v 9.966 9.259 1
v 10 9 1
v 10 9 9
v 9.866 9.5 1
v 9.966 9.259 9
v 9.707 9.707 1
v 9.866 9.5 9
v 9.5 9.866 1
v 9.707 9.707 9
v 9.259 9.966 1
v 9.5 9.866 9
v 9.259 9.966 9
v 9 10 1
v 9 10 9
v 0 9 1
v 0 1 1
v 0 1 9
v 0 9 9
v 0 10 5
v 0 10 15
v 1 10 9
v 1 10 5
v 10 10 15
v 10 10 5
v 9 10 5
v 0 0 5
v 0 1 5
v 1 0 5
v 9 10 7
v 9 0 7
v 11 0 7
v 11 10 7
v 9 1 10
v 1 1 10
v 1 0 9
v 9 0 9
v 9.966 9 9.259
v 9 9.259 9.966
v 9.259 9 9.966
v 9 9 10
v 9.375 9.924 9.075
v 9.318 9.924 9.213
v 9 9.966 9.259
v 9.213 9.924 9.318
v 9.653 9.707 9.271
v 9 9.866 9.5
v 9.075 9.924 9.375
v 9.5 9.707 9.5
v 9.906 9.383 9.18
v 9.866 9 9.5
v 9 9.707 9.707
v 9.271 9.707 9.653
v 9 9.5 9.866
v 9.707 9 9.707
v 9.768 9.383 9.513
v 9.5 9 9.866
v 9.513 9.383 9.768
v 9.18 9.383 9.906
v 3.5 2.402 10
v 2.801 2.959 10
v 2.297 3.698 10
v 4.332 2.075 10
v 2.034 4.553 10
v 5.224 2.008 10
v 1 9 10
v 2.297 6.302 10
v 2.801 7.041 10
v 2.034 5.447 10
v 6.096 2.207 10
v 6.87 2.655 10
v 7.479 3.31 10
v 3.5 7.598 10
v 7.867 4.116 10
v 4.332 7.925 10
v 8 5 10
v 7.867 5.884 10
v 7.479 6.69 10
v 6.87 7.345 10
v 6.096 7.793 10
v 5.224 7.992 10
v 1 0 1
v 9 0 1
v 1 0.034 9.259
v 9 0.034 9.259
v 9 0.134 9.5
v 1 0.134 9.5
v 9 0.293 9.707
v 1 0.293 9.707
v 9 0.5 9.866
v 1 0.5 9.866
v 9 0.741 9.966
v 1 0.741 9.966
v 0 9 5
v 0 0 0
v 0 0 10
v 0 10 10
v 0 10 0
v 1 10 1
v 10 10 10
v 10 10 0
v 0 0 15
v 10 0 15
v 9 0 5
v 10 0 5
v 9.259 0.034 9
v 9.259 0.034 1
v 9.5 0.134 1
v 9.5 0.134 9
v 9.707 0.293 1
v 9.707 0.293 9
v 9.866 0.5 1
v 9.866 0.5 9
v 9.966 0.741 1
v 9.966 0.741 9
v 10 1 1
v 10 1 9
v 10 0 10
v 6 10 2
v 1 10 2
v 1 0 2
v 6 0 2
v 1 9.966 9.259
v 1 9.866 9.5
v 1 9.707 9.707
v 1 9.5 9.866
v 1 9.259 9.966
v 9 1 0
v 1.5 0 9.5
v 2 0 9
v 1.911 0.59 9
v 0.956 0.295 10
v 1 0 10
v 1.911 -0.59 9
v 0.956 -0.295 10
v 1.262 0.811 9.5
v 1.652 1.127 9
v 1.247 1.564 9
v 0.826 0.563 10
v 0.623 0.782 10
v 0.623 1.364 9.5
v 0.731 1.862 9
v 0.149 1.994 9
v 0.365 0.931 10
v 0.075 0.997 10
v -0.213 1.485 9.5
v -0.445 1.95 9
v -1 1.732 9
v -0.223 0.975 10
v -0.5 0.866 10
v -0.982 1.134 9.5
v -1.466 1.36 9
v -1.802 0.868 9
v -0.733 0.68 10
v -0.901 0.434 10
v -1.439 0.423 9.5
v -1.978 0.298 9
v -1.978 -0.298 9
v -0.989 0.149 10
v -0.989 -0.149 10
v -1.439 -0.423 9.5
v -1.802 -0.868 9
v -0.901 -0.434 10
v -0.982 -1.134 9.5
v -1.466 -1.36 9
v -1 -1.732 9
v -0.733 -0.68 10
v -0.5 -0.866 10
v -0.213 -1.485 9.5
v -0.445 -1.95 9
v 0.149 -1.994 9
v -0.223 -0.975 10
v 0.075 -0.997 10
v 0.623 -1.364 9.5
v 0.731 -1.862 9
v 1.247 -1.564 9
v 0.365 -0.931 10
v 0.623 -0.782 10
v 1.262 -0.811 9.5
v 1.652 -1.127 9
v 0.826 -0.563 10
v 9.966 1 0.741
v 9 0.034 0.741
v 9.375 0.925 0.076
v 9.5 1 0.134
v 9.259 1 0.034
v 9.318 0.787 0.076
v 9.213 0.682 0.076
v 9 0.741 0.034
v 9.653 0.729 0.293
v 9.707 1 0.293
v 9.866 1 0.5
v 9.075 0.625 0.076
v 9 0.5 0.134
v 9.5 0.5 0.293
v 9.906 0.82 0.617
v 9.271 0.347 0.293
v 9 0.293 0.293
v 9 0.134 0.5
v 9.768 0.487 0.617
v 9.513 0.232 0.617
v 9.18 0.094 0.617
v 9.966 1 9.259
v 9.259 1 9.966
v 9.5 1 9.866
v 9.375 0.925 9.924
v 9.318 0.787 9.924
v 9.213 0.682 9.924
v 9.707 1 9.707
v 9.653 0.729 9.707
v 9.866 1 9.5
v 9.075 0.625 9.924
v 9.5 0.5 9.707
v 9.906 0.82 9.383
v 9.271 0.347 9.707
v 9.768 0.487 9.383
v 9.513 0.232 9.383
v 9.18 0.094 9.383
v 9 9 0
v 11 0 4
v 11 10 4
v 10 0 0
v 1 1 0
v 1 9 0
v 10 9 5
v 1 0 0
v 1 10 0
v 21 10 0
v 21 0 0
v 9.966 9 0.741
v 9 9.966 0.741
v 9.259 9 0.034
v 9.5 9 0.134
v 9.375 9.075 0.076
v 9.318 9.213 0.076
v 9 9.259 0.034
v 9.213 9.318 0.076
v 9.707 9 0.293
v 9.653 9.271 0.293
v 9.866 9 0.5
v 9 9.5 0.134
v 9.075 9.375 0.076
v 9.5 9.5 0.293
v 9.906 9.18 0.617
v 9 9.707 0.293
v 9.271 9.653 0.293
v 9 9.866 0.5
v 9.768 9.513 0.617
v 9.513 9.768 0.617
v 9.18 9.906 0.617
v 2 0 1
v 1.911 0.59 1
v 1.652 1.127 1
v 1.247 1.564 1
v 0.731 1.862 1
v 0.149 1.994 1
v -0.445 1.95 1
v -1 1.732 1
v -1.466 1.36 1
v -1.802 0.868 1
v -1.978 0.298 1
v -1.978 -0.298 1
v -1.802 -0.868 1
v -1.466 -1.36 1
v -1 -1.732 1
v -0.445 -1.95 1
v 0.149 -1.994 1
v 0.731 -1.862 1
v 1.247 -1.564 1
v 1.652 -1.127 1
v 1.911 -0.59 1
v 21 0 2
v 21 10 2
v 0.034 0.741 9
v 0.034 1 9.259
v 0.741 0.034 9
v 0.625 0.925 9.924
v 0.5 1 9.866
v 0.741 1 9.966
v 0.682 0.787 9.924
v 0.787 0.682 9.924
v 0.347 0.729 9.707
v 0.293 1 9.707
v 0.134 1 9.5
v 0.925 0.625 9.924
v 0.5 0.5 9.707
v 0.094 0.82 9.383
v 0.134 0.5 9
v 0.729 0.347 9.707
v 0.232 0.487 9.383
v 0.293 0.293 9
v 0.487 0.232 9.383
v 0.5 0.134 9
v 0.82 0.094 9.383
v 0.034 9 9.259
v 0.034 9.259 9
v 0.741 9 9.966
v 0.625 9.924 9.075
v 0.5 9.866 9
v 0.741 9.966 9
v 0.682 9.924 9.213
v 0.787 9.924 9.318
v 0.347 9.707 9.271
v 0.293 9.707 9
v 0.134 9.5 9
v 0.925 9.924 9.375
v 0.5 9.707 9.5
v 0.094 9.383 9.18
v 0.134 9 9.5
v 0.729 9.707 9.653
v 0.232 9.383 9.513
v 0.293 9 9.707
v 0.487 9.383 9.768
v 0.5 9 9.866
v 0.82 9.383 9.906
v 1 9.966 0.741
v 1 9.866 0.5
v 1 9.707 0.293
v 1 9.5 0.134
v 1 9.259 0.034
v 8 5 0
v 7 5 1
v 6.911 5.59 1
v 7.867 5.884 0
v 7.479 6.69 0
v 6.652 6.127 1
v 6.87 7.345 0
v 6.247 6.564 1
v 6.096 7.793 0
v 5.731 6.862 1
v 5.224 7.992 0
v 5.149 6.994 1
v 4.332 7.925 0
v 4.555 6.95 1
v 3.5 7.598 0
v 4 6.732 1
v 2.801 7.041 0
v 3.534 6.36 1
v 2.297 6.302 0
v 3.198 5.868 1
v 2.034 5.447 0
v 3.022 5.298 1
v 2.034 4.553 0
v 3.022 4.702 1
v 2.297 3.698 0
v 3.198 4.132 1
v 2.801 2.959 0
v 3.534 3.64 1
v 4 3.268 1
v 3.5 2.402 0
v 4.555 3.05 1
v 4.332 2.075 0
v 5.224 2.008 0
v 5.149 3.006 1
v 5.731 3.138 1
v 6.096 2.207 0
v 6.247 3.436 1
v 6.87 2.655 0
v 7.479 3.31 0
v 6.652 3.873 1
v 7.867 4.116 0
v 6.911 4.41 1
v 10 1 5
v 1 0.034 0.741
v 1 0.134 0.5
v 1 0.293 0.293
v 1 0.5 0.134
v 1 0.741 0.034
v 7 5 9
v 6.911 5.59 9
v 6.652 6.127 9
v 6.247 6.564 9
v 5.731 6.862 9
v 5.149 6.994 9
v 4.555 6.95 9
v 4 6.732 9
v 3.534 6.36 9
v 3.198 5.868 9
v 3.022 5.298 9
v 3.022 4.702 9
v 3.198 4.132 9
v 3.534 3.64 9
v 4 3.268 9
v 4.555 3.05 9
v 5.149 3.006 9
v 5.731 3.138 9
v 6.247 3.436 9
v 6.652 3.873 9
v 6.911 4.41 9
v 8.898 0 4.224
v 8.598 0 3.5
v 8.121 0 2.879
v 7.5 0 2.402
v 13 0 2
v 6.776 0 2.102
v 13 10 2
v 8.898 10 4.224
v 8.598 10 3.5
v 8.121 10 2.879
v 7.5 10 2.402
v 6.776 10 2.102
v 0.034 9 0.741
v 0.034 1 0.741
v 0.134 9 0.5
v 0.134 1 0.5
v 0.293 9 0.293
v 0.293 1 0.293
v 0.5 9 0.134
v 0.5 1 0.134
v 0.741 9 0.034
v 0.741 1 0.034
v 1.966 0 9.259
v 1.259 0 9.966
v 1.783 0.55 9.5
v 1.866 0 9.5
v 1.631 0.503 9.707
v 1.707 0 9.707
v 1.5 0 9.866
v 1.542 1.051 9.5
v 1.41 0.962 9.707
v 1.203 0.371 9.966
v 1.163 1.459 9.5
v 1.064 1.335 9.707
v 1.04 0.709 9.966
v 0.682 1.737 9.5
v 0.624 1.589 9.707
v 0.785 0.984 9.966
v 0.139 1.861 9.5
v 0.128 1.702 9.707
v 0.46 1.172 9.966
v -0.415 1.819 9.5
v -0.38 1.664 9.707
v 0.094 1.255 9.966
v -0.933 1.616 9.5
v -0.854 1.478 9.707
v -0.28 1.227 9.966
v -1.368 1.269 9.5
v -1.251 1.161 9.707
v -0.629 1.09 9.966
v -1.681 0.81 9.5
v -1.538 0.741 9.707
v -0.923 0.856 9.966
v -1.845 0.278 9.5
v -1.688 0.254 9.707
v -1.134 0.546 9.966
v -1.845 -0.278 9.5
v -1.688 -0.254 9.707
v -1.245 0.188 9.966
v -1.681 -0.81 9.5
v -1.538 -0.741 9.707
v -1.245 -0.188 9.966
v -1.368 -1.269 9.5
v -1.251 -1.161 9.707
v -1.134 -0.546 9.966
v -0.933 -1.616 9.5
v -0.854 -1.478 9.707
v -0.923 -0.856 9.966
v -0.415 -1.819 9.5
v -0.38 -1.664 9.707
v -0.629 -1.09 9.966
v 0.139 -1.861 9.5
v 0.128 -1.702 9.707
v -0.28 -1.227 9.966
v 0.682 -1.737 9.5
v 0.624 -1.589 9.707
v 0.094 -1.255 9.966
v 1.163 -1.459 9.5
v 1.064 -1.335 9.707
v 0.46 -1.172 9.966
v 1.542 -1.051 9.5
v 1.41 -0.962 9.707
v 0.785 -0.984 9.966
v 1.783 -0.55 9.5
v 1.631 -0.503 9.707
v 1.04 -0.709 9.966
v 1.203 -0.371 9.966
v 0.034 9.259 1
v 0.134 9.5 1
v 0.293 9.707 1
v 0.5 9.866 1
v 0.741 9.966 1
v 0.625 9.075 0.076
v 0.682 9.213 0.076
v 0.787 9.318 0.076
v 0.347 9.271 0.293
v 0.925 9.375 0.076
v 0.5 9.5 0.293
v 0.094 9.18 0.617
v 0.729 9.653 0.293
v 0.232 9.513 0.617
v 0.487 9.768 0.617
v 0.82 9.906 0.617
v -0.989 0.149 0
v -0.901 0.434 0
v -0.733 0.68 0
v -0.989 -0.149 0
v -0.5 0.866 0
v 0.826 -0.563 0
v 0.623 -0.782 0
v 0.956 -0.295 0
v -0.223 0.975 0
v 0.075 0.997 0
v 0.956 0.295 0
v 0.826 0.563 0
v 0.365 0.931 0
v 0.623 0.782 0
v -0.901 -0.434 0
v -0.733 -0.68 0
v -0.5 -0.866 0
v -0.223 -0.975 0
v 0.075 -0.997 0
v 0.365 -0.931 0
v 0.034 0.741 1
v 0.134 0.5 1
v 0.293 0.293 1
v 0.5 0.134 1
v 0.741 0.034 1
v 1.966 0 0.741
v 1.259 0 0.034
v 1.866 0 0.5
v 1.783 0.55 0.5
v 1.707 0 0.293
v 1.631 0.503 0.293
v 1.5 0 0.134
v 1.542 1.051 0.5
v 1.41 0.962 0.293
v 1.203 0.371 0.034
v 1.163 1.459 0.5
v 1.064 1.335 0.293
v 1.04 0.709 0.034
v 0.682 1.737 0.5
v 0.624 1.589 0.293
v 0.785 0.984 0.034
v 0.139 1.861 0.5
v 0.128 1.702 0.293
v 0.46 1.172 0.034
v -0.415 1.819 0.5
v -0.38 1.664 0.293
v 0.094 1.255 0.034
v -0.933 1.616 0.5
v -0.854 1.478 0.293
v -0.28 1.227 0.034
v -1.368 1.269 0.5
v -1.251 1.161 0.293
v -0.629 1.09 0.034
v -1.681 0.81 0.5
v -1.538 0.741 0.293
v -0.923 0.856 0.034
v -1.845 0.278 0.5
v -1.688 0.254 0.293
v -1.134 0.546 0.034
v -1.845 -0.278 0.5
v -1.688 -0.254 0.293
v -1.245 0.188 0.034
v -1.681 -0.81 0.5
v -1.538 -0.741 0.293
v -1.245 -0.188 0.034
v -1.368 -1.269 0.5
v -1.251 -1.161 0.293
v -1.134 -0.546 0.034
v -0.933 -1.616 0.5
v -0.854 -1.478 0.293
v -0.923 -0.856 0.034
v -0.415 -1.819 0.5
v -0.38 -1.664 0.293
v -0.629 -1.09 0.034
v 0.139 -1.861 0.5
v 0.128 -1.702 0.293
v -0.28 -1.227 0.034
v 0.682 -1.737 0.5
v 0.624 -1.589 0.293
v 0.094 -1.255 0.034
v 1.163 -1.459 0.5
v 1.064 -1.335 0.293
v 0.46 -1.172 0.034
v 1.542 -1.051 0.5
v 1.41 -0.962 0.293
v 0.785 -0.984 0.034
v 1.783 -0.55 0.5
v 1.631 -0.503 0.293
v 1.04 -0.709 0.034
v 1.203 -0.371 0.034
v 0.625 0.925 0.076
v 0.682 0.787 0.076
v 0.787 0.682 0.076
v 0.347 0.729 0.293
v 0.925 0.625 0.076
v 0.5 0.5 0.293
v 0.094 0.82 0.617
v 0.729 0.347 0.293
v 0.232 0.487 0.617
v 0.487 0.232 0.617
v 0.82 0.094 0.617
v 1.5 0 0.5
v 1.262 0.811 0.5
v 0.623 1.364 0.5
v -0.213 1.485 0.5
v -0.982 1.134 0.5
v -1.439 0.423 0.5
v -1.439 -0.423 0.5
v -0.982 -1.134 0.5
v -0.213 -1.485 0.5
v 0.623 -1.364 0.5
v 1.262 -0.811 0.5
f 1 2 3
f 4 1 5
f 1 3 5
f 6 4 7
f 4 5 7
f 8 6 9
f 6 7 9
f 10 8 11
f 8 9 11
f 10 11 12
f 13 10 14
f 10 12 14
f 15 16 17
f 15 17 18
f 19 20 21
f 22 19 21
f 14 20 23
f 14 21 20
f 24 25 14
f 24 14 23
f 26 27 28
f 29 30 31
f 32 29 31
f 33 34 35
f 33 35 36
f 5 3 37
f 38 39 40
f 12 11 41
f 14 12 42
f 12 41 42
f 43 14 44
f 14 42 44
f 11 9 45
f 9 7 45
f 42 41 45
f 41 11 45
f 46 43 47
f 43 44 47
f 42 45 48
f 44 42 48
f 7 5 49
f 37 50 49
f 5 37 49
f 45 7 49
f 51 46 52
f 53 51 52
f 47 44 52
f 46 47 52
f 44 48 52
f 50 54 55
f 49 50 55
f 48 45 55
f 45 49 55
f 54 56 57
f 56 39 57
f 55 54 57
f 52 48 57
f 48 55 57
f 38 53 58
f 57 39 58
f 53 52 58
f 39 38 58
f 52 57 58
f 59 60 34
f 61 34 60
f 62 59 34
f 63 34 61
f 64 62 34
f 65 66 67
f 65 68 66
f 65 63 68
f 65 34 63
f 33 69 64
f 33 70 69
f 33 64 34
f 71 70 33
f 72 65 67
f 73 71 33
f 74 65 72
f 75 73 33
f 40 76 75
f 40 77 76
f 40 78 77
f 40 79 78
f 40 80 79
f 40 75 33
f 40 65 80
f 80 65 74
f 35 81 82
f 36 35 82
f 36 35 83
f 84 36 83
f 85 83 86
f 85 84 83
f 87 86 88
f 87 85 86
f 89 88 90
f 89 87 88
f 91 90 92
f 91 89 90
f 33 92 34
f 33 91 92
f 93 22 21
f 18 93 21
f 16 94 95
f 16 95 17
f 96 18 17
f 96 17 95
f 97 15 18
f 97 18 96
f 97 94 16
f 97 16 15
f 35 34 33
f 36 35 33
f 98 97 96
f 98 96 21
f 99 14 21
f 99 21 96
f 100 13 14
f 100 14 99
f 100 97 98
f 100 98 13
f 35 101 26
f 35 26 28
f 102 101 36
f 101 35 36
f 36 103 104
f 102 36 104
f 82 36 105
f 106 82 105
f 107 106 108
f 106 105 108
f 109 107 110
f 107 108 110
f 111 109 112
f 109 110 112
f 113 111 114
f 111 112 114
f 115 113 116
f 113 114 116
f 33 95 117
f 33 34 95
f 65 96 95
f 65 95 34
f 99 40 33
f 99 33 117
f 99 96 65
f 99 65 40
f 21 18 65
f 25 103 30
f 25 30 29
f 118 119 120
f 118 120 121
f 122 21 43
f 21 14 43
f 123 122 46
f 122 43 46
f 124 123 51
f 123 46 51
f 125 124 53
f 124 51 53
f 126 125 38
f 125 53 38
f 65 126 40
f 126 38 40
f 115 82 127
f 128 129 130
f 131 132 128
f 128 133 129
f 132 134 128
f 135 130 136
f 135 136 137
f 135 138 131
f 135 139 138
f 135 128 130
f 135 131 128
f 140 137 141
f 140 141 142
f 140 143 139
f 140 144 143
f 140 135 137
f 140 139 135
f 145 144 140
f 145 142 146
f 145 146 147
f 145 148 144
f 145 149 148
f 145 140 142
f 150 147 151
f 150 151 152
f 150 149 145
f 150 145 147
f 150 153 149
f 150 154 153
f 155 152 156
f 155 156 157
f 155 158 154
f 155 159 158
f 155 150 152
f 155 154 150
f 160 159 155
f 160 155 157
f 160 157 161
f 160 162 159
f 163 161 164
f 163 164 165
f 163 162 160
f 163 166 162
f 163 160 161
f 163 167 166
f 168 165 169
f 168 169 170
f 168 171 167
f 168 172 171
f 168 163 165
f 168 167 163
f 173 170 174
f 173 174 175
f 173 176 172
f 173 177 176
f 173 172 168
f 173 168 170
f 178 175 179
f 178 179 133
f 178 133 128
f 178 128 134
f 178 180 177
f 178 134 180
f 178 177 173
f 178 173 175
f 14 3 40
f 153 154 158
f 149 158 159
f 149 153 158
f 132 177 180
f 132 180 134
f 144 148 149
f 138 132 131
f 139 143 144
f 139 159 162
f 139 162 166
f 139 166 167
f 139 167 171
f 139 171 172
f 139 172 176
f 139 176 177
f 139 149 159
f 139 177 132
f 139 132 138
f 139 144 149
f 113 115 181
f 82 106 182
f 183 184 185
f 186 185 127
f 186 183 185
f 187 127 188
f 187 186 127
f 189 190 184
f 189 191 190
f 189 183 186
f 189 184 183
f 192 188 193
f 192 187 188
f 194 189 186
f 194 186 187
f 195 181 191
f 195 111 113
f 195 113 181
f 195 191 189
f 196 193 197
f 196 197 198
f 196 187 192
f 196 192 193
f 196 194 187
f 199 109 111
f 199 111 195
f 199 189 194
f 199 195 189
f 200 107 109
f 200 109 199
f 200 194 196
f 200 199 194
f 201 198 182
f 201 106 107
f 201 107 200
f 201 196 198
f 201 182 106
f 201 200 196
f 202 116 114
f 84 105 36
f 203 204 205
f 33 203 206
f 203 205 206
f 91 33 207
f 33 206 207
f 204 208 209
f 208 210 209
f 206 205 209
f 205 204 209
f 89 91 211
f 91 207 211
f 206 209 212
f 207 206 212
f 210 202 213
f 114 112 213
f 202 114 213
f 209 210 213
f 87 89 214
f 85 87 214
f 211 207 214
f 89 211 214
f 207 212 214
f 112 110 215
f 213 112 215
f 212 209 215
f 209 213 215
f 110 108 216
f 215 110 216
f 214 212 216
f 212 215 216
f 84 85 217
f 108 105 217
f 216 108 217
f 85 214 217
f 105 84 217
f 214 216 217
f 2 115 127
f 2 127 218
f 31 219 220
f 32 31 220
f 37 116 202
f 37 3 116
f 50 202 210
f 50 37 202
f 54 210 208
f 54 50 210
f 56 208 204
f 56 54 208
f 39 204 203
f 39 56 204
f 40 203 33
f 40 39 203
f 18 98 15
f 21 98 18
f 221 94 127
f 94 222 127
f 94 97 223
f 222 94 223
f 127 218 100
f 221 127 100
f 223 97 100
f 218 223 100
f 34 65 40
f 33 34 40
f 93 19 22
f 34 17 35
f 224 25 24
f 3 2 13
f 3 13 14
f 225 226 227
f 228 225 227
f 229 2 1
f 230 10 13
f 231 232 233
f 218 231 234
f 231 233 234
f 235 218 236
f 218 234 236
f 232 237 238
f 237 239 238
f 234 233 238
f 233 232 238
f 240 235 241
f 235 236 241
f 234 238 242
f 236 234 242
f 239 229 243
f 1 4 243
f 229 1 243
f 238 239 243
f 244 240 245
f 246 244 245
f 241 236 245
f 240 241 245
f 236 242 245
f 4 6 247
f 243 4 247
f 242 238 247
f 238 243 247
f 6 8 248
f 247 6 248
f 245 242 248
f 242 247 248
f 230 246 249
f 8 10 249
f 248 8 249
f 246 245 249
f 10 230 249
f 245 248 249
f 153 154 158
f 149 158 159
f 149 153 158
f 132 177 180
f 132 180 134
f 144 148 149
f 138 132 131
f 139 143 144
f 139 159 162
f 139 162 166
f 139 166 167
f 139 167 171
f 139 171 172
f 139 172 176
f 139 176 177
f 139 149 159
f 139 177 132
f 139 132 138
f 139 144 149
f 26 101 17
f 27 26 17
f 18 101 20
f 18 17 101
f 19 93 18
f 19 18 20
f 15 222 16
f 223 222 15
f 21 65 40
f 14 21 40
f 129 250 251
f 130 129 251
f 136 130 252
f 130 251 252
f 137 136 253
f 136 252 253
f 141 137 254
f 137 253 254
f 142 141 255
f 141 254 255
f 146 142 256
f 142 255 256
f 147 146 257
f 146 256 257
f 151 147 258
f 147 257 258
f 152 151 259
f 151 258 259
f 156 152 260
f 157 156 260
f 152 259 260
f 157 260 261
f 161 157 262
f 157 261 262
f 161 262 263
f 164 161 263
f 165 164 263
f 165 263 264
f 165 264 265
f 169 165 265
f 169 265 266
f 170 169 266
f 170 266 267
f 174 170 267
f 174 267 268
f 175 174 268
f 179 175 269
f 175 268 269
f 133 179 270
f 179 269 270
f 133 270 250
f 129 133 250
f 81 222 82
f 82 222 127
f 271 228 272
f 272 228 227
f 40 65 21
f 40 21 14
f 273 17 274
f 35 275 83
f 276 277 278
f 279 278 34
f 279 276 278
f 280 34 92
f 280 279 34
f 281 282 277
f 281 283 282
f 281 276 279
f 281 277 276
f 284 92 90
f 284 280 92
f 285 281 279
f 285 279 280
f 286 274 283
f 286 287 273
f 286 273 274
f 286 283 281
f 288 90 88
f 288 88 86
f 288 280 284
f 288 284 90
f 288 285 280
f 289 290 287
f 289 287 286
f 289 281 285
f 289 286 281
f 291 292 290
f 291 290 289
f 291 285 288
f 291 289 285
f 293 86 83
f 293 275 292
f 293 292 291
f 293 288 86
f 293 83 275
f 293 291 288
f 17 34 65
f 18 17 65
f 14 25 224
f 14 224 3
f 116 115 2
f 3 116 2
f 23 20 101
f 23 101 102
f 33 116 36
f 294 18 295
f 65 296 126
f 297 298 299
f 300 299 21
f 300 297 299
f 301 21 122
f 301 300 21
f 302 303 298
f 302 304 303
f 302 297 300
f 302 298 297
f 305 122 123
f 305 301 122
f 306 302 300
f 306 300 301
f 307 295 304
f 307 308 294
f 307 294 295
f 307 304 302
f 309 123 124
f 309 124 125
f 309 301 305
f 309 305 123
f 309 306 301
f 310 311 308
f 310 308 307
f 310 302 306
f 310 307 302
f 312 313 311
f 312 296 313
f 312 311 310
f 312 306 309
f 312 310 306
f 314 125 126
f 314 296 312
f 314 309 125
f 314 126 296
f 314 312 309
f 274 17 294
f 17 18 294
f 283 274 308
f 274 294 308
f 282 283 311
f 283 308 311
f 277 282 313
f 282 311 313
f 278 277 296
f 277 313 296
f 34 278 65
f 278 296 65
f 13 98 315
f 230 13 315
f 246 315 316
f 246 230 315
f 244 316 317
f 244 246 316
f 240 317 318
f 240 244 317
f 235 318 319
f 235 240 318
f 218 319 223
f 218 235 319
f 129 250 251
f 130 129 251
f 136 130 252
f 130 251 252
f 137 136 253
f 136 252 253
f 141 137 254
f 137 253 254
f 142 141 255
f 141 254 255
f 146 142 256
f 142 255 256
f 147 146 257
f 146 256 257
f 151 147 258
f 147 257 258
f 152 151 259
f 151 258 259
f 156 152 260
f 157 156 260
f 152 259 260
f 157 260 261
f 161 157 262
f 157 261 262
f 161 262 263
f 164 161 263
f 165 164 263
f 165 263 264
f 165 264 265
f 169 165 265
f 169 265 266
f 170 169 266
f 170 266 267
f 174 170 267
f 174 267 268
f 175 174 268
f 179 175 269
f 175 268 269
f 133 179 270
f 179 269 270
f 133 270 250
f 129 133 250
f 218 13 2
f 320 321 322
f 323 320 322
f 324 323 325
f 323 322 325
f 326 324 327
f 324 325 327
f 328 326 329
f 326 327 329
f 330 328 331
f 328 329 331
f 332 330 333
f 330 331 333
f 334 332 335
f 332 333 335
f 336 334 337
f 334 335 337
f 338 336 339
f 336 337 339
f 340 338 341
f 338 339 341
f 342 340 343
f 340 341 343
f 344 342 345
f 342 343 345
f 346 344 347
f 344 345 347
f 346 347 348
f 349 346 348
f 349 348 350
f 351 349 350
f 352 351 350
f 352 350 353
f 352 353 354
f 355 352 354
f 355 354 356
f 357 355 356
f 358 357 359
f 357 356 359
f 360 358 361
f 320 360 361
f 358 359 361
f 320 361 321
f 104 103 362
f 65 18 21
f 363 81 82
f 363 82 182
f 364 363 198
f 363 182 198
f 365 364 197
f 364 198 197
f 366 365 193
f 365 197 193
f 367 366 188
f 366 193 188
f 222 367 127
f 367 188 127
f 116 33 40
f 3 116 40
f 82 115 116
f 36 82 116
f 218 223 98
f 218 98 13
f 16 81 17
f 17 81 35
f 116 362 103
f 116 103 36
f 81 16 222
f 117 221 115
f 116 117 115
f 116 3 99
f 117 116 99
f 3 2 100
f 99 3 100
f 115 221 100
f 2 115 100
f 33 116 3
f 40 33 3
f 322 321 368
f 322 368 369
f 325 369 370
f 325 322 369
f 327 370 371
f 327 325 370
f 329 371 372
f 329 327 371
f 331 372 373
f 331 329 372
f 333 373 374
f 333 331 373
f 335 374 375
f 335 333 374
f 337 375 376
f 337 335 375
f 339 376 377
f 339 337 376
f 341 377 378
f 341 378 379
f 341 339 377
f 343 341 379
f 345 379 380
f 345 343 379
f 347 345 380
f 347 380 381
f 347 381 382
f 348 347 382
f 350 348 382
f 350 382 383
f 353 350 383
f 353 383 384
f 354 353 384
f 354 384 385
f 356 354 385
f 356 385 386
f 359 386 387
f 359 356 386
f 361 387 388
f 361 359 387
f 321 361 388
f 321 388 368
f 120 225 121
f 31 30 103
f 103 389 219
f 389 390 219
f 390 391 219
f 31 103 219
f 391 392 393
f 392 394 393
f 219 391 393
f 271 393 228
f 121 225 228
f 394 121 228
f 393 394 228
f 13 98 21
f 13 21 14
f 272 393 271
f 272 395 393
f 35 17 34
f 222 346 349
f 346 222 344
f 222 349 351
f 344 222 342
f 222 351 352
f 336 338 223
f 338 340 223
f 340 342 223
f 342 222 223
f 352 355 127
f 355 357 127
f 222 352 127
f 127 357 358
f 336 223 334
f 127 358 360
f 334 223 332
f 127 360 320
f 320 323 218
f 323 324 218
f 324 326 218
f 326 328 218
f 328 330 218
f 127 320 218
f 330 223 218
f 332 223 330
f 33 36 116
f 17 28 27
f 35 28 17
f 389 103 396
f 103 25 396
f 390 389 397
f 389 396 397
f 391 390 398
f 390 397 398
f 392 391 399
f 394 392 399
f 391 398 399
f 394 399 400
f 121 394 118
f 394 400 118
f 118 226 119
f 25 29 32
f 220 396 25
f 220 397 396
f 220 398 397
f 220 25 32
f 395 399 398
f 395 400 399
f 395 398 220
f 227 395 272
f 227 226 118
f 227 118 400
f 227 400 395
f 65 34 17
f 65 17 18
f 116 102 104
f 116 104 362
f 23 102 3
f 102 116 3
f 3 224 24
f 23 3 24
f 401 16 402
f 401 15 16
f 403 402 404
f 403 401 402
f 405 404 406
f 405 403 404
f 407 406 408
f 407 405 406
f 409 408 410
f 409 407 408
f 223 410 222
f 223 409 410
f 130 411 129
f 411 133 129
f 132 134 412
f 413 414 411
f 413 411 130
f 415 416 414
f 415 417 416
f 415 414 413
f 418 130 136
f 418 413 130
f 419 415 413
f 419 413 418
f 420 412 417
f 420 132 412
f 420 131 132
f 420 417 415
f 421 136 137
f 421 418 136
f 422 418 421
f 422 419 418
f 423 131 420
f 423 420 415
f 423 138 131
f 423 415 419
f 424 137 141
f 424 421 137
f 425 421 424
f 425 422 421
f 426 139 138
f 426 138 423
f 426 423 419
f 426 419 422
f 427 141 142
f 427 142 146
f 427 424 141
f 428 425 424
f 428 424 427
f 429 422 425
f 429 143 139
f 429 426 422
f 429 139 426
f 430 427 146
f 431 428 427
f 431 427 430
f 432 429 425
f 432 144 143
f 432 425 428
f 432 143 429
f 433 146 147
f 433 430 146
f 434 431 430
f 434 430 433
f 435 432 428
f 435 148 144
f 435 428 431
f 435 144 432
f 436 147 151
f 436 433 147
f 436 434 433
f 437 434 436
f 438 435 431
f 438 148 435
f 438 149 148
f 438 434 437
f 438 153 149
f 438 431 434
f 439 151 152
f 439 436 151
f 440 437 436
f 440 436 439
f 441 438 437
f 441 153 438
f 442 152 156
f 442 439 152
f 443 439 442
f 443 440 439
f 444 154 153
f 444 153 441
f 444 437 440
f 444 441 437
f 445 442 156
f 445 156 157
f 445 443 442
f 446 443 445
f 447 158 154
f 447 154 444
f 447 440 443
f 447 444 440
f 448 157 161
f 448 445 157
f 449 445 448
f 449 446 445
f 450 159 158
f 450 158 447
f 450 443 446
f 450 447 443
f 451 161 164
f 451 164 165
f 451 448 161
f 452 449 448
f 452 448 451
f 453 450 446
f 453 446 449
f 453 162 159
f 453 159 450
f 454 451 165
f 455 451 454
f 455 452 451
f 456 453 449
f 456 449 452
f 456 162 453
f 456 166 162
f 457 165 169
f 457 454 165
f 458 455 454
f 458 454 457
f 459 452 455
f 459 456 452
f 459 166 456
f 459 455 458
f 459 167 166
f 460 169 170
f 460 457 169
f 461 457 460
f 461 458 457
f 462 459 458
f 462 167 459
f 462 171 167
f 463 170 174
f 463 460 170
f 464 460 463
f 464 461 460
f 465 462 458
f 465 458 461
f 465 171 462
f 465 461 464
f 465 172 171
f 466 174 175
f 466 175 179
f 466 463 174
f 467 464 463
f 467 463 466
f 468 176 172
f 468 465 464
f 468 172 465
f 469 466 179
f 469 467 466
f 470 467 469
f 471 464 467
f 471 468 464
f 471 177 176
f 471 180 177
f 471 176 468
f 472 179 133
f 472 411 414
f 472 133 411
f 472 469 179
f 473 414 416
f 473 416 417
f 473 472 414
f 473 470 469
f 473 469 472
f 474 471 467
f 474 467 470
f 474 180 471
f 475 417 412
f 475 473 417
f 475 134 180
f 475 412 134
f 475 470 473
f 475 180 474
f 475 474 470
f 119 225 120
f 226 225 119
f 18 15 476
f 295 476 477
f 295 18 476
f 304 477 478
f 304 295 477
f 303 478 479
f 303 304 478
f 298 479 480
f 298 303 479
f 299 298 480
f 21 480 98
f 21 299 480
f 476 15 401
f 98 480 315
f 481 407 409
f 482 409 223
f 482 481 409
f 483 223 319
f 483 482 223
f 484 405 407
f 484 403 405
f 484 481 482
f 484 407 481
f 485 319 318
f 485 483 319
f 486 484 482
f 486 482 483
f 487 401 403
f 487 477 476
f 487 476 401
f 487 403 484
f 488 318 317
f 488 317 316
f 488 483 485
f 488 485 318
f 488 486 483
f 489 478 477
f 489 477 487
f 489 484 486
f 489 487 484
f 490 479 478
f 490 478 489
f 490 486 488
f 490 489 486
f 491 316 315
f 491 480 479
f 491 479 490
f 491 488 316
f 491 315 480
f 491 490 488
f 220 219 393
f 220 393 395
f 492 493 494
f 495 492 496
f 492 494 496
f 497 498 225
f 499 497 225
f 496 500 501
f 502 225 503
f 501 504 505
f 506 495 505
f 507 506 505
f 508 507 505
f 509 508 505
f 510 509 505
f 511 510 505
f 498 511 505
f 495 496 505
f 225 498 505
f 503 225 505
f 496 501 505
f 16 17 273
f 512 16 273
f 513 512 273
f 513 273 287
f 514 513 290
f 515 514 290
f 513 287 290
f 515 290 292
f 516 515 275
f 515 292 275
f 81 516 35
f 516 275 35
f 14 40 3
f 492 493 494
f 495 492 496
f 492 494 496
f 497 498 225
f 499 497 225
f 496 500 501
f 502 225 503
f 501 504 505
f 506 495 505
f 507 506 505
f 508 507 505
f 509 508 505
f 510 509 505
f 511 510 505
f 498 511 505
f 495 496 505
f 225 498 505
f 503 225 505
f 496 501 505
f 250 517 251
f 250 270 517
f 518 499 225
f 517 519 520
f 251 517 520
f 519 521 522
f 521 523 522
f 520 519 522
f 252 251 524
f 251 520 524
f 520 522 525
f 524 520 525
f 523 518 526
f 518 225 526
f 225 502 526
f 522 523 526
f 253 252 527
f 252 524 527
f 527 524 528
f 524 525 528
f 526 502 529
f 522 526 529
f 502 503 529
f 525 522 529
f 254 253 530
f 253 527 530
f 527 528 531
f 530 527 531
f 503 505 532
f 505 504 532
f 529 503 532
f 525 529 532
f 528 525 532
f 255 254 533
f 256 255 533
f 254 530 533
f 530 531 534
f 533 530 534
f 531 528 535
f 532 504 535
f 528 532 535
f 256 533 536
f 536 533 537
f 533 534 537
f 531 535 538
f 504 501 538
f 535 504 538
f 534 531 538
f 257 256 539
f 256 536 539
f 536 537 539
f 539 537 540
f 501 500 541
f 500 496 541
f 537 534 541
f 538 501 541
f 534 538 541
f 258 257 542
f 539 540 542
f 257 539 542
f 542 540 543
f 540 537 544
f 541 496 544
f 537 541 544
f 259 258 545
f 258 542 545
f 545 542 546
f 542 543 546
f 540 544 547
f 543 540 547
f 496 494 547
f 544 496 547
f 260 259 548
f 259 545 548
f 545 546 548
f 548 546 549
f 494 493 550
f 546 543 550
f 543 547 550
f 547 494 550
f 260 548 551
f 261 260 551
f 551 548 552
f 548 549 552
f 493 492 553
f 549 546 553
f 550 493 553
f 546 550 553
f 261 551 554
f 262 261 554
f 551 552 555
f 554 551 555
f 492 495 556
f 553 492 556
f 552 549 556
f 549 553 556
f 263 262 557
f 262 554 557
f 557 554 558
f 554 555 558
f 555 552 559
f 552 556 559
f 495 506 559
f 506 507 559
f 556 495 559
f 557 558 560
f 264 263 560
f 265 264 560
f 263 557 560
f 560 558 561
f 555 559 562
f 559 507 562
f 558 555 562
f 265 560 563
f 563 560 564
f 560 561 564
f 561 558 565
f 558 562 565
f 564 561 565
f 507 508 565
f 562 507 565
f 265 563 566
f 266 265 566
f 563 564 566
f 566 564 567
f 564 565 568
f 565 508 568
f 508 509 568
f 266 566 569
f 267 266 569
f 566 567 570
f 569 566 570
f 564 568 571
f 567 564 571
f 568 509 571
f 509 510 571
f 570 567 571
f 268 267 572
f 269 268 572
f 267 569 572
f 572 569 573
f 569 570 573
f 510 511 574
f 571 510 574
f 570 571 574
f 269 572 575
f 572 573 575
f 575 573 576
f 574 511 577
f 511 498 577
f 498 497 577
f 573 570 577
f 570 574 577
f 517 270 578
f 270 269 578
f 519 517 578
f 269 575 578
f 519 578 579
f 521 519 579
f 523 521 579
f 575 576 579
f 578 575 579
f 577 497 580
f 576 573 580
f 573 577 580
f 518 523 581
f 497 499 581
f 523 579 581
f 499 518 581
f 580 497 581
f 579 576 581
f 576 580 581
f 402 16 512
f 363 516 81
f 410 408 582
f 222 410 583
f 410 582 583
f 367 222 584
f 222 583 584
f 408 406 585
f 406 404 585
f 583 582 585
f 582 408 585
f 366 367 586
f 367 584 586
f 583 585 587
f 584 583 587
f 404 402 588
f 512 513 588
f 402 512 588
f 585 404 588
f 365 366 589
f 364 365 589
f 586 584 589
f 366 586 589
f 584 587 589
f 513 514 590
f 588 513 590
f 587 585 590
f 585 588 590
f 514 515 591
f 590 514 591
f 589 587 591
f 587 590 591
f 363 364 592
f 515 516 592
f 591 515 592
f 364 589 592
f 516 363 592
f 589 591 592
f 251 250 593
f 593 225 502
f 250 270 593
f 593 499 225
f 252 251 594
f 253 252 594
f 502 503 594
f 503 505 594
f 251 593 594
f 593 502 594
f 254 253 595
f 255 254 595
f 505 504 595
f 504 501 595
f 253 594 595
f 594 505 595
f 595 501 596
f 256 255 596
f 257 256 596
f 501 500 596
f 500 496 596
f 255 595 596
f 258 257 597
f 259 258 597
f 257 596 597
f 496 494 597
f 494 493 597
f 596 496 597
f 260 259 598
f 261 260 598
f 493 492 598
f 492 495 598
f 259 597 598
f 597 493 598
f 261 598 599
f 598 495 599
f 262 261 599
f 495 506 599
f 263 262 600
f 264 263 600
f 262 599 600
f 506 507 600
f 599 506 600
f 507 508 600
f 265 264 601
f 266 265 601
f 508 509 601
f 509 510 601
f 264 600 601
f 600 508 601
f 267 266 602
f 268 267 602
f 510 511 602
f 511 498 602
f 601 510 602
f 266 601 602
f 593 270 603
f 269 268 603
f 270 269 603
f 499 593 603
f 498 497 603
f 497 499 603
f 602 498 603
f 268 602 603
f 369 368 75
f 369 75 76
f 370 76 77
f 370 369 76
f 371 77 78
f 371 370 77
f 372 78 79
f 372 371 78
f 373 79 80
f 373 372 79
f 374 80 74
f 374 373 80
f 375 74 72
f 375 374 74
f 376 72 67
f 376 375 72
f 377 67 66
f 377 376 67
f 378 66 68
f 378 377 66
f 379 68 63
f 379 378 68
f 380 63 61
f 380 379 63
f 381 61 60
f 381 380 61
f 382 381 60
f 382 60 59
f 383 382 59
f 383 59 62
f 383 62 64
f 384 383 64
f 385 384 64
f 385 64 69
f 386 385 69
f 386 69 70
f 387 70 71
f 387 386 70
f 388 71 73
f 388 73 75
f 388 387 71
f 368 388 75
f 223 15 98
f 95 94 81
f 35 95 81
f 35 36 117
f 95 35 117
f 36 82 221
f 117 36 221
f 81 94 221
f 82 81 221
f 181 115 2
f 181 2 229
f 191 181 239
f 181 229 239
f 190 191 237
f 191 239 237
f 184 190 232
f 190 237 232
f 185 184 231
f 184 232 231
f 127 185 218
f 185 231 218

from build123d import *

# Parameters (mm, degrees)
BOX_W             = 10
BOX_H             = 10
BOX_DEPTH         = 10
FILLET_R          = 1
BOX001_W          = 10
BOX001_H          = 10
BOX001_DEPTH      = 10
BOX002_W          = 10
BOX002_H          = 10
BOX002_DEPTH      = 10
CHAMFER_SIZE      = 1
BOX003_W          = 10
BOX003_H          = 10
BOX003_DEPTH      = 10
CYLINDER_R        = 2
CYLINDER_DEPTH    = 10
BOX004_W          = 10
BOX004_H          = 10
BOX004_DEPTH      = 10
CHAMFER001_SIZE   = 1
CYLINDER001_R     = 2
CYLINDER001_DEPTH = 10
FILLET001_R       = 1
CYLINDER002_R     = 2
CYLINDER002_DEPTH = 10
CHAMFER002_SIZE   = 1
BOX007_W          = 10
BOX007_H          = 10
BOX007_DEPTH      = 5
BOX006_W          = 10
BOX006_H          = 10
BOX006_DEPTH      = 5
BOX005_W          = 20
BOX005_H          = 10
BOX005_DEPTH      = 7
CHAMFER003_SIZE   = 2
FILLET002_R       = 3


with BuildPart() as fillet_body:
    # Box → Box (new body)
    with BuildSketch(Plane.XY):
        with Locations((5, 5)):
            Rectangle(BOX_W, BOX_H)
    extrude(amount=BOX_DEPTH)

    # Fillet
    fillet_edges = [fillet_body.edges().sort_by_distance(p)[0] for p in [
        (0, 0, 5),
        (0, 5, 10),
        (0, 10, 5),
        (0, 5, 0),
        (10, 0, 5),
        (10, 5, 10),
        (10, 10, 5),
        (10, 5, 0),
        (5, 0, 0),
        (5, 0, 10),
        (5, 10, 0),
        (5, 10, 10),
    ]]
    fillet(fillet_edges, radius=FILLET_R)


with BuildPart() as cut:
    # Box001 → Box001 (new body)
    with BuildSketch(Plane.XY):
        with Locations((5, 5)):
            Rectangle(BOX001_W, BOX001_H)
    extrude(amount=BOX001_DEPTH)

    # Cut: cut Fillet body
    add(fillet_body.part, mode=Mode.SUBTRACT)


with BuildPart() as chamfer_body:
    # Box002 → Box002 (new body)
    with BuildSketch(Plane.XY):
        with Locations((5, 5)):
            Rectangle(BOX002_W, BOX002_H)
    extrude(amount=BOX002_DEPTH)

    # Chamfer
    chamfer_edges = [chamfer_body.edges().sort_by_distance(p)[0] for p in [
        (0, 0, 5),
        (0, 5, 10),
        (0, 10, 5),
        (0, 5, 0),
        (10, 0, 5),
        (10, 5, 10),
        (10, 10, 5),
        (10, 5, 0),
        (5, 0, 0),
        (5, 0, 10),
        (5, 10, 0),
        (5, 10, 10),
    ]]
    chamfer(chamfer_edges, length=CHAMFER_SIZE)


with BuildPart() as cut001:
    # Box003 → Box003 (new body)
    with BuildSketch(Plane.XY.offset(5)):
        with Locations((5, 5)):
            Rectangle(BOX003_W, BOX003_H)
    extrude(amount=BOX003_DEPTH)

    # Cut001: cut Chamfer body
    add(chamfer_body.part, mode=Mode.SUBTRACT)


with BuildPart() as cilindro:
    # Cylinder → Cylinder (new body)
    with BuildSketch(Plane(origin=(5, 5, 0), x_dir=(1, 0, 0), z_dir=(0, 0, 1))):
        Circle(CYLINDER_R)
    extrude(amount=CYLINDER_DEPTH)


with BuildPart() as chamfer001:
    # Box004 → Box004 (new body)
    with BuildSketch(Plane.XY):
        with Locations((5, 5)):
            Rectangle(BOX004_W, BOX004_H)
    extrude(amount=BOX004_DEPTH)

    # Cut002: cut Cilindro
    add(cilindro.part, mode=Mode.SUBTRACT)

    # Chamfer001
    chamfer001_edges = [chamfer001.edges().sort_by_distance(p)[0] for p in [
        (0, 0, 5),
        (0, 5, 10),
        (0, 10, 5),
        (0, 5, 0),
        (5, 0, 0),
        (10, 0, 5),
        (5, 0, 10),
        (5, 10, 10),
        (10, 5, 10),
        (3, 5, 10),
        (5, 10, 0),
        (10, 10, 5),
        (10, 5, 0),
        (3, 5, 0),
    ]]
    chamfer(chamfer001_edges, length=CHAMFER001_SIZE)


with BuildPart() as fillet001:
    # Cylinder001 → Cylinder001 (new body)
    with BuildSketch(Plane.XY):
        Circle(CYLINDER001_R)
    extrude(amount=CYLINDER001_DEPTH)

    # Fillet001
    fillet001_edges = [fillet001.edges().sort_by_distance(p)[0] for p in [
        (-2, 0, 10),
        (-2, 0, 0),
    ]]
    fillet(fillet001_edges, radius=FILLET001_R)


with BuildPart() as chamfer002:
    # Cylinder002 → Cylinder002 (new body)
    with BuildSketch(Plane.XY):
        Circle(CYLINDER002_R)
    extrude(amount=CYLINDER002_DEPTH)

    # Chamfer002
    chamfer002_edges = [chamfer002.edges().sort_by_distance(p)[0] for p in [
        (-2, 0, 10),
        (-2, 0, 0),
    ]]
    chamfer(chamfer002_edges, length=CHAMFER002_SIZE)


with BuildPart() as cubo:
    # Box007 → Box007 (new body)
    with BuildSketch(Plane(origin=(11, 0, 2), x_dir=(1, 0, 0), z_dir=(0, 0, 1))):
        with Locations((5, 5)):
            Rectangle(BOX007_W, BOX007_H)
    extrude(amount=BOX007_DEPTH)


with BuildPart() as fusion:
    # Box006 → Box006 (new body)
    with BuildSketch(Plane(origin=(-1, 0, 2), x_dir=(1, 0, 0), z_dir=(0, 0, 1))):
        with Locations((5, 5)):
            Rectangle(BOX006_W, BOX006_H)
    extrude(amount=BOX006_DEPTH)

    # Fusion: union Cubo
    add(cubo.part)


with BuildPart() as fillet002:
    # Box005 → Box005 (new body)
    with BuildSketch(Plane(origin=(1, 0, 0), x_dir=(1, 0, 0), z_dir=(0, 0, 1))):
        with Locations((10, 5)):
            Rectangle(BOX005_W, BOX005_H)
    extrude(amount=BOX005_DEPTH)

    # Cut003: cut Fusion
    add(fusion.part, mode=Mode.SUBTRACT)

    # Chamfer003
    chamfer003_edges = [fillet002.edges().sort_by_distance(p)[0] for p in [
        (11, 5, 2),
    ]]
    chamfer(chamfer003_edges, length=CHAMFER003_SIZE)

    # Fillet002
    fillet002_edges = [fillet002.edges().sort_by_distance(p)[0] for p in [
        (9, 5, 2),
    ]]
    fillet(fillet002_edges, radius=FILLET002_R)


solid = Compound([cut.part, cut001.part, chamfer001.part, fillet001.part, chamfer002.part, fillet002.part])
